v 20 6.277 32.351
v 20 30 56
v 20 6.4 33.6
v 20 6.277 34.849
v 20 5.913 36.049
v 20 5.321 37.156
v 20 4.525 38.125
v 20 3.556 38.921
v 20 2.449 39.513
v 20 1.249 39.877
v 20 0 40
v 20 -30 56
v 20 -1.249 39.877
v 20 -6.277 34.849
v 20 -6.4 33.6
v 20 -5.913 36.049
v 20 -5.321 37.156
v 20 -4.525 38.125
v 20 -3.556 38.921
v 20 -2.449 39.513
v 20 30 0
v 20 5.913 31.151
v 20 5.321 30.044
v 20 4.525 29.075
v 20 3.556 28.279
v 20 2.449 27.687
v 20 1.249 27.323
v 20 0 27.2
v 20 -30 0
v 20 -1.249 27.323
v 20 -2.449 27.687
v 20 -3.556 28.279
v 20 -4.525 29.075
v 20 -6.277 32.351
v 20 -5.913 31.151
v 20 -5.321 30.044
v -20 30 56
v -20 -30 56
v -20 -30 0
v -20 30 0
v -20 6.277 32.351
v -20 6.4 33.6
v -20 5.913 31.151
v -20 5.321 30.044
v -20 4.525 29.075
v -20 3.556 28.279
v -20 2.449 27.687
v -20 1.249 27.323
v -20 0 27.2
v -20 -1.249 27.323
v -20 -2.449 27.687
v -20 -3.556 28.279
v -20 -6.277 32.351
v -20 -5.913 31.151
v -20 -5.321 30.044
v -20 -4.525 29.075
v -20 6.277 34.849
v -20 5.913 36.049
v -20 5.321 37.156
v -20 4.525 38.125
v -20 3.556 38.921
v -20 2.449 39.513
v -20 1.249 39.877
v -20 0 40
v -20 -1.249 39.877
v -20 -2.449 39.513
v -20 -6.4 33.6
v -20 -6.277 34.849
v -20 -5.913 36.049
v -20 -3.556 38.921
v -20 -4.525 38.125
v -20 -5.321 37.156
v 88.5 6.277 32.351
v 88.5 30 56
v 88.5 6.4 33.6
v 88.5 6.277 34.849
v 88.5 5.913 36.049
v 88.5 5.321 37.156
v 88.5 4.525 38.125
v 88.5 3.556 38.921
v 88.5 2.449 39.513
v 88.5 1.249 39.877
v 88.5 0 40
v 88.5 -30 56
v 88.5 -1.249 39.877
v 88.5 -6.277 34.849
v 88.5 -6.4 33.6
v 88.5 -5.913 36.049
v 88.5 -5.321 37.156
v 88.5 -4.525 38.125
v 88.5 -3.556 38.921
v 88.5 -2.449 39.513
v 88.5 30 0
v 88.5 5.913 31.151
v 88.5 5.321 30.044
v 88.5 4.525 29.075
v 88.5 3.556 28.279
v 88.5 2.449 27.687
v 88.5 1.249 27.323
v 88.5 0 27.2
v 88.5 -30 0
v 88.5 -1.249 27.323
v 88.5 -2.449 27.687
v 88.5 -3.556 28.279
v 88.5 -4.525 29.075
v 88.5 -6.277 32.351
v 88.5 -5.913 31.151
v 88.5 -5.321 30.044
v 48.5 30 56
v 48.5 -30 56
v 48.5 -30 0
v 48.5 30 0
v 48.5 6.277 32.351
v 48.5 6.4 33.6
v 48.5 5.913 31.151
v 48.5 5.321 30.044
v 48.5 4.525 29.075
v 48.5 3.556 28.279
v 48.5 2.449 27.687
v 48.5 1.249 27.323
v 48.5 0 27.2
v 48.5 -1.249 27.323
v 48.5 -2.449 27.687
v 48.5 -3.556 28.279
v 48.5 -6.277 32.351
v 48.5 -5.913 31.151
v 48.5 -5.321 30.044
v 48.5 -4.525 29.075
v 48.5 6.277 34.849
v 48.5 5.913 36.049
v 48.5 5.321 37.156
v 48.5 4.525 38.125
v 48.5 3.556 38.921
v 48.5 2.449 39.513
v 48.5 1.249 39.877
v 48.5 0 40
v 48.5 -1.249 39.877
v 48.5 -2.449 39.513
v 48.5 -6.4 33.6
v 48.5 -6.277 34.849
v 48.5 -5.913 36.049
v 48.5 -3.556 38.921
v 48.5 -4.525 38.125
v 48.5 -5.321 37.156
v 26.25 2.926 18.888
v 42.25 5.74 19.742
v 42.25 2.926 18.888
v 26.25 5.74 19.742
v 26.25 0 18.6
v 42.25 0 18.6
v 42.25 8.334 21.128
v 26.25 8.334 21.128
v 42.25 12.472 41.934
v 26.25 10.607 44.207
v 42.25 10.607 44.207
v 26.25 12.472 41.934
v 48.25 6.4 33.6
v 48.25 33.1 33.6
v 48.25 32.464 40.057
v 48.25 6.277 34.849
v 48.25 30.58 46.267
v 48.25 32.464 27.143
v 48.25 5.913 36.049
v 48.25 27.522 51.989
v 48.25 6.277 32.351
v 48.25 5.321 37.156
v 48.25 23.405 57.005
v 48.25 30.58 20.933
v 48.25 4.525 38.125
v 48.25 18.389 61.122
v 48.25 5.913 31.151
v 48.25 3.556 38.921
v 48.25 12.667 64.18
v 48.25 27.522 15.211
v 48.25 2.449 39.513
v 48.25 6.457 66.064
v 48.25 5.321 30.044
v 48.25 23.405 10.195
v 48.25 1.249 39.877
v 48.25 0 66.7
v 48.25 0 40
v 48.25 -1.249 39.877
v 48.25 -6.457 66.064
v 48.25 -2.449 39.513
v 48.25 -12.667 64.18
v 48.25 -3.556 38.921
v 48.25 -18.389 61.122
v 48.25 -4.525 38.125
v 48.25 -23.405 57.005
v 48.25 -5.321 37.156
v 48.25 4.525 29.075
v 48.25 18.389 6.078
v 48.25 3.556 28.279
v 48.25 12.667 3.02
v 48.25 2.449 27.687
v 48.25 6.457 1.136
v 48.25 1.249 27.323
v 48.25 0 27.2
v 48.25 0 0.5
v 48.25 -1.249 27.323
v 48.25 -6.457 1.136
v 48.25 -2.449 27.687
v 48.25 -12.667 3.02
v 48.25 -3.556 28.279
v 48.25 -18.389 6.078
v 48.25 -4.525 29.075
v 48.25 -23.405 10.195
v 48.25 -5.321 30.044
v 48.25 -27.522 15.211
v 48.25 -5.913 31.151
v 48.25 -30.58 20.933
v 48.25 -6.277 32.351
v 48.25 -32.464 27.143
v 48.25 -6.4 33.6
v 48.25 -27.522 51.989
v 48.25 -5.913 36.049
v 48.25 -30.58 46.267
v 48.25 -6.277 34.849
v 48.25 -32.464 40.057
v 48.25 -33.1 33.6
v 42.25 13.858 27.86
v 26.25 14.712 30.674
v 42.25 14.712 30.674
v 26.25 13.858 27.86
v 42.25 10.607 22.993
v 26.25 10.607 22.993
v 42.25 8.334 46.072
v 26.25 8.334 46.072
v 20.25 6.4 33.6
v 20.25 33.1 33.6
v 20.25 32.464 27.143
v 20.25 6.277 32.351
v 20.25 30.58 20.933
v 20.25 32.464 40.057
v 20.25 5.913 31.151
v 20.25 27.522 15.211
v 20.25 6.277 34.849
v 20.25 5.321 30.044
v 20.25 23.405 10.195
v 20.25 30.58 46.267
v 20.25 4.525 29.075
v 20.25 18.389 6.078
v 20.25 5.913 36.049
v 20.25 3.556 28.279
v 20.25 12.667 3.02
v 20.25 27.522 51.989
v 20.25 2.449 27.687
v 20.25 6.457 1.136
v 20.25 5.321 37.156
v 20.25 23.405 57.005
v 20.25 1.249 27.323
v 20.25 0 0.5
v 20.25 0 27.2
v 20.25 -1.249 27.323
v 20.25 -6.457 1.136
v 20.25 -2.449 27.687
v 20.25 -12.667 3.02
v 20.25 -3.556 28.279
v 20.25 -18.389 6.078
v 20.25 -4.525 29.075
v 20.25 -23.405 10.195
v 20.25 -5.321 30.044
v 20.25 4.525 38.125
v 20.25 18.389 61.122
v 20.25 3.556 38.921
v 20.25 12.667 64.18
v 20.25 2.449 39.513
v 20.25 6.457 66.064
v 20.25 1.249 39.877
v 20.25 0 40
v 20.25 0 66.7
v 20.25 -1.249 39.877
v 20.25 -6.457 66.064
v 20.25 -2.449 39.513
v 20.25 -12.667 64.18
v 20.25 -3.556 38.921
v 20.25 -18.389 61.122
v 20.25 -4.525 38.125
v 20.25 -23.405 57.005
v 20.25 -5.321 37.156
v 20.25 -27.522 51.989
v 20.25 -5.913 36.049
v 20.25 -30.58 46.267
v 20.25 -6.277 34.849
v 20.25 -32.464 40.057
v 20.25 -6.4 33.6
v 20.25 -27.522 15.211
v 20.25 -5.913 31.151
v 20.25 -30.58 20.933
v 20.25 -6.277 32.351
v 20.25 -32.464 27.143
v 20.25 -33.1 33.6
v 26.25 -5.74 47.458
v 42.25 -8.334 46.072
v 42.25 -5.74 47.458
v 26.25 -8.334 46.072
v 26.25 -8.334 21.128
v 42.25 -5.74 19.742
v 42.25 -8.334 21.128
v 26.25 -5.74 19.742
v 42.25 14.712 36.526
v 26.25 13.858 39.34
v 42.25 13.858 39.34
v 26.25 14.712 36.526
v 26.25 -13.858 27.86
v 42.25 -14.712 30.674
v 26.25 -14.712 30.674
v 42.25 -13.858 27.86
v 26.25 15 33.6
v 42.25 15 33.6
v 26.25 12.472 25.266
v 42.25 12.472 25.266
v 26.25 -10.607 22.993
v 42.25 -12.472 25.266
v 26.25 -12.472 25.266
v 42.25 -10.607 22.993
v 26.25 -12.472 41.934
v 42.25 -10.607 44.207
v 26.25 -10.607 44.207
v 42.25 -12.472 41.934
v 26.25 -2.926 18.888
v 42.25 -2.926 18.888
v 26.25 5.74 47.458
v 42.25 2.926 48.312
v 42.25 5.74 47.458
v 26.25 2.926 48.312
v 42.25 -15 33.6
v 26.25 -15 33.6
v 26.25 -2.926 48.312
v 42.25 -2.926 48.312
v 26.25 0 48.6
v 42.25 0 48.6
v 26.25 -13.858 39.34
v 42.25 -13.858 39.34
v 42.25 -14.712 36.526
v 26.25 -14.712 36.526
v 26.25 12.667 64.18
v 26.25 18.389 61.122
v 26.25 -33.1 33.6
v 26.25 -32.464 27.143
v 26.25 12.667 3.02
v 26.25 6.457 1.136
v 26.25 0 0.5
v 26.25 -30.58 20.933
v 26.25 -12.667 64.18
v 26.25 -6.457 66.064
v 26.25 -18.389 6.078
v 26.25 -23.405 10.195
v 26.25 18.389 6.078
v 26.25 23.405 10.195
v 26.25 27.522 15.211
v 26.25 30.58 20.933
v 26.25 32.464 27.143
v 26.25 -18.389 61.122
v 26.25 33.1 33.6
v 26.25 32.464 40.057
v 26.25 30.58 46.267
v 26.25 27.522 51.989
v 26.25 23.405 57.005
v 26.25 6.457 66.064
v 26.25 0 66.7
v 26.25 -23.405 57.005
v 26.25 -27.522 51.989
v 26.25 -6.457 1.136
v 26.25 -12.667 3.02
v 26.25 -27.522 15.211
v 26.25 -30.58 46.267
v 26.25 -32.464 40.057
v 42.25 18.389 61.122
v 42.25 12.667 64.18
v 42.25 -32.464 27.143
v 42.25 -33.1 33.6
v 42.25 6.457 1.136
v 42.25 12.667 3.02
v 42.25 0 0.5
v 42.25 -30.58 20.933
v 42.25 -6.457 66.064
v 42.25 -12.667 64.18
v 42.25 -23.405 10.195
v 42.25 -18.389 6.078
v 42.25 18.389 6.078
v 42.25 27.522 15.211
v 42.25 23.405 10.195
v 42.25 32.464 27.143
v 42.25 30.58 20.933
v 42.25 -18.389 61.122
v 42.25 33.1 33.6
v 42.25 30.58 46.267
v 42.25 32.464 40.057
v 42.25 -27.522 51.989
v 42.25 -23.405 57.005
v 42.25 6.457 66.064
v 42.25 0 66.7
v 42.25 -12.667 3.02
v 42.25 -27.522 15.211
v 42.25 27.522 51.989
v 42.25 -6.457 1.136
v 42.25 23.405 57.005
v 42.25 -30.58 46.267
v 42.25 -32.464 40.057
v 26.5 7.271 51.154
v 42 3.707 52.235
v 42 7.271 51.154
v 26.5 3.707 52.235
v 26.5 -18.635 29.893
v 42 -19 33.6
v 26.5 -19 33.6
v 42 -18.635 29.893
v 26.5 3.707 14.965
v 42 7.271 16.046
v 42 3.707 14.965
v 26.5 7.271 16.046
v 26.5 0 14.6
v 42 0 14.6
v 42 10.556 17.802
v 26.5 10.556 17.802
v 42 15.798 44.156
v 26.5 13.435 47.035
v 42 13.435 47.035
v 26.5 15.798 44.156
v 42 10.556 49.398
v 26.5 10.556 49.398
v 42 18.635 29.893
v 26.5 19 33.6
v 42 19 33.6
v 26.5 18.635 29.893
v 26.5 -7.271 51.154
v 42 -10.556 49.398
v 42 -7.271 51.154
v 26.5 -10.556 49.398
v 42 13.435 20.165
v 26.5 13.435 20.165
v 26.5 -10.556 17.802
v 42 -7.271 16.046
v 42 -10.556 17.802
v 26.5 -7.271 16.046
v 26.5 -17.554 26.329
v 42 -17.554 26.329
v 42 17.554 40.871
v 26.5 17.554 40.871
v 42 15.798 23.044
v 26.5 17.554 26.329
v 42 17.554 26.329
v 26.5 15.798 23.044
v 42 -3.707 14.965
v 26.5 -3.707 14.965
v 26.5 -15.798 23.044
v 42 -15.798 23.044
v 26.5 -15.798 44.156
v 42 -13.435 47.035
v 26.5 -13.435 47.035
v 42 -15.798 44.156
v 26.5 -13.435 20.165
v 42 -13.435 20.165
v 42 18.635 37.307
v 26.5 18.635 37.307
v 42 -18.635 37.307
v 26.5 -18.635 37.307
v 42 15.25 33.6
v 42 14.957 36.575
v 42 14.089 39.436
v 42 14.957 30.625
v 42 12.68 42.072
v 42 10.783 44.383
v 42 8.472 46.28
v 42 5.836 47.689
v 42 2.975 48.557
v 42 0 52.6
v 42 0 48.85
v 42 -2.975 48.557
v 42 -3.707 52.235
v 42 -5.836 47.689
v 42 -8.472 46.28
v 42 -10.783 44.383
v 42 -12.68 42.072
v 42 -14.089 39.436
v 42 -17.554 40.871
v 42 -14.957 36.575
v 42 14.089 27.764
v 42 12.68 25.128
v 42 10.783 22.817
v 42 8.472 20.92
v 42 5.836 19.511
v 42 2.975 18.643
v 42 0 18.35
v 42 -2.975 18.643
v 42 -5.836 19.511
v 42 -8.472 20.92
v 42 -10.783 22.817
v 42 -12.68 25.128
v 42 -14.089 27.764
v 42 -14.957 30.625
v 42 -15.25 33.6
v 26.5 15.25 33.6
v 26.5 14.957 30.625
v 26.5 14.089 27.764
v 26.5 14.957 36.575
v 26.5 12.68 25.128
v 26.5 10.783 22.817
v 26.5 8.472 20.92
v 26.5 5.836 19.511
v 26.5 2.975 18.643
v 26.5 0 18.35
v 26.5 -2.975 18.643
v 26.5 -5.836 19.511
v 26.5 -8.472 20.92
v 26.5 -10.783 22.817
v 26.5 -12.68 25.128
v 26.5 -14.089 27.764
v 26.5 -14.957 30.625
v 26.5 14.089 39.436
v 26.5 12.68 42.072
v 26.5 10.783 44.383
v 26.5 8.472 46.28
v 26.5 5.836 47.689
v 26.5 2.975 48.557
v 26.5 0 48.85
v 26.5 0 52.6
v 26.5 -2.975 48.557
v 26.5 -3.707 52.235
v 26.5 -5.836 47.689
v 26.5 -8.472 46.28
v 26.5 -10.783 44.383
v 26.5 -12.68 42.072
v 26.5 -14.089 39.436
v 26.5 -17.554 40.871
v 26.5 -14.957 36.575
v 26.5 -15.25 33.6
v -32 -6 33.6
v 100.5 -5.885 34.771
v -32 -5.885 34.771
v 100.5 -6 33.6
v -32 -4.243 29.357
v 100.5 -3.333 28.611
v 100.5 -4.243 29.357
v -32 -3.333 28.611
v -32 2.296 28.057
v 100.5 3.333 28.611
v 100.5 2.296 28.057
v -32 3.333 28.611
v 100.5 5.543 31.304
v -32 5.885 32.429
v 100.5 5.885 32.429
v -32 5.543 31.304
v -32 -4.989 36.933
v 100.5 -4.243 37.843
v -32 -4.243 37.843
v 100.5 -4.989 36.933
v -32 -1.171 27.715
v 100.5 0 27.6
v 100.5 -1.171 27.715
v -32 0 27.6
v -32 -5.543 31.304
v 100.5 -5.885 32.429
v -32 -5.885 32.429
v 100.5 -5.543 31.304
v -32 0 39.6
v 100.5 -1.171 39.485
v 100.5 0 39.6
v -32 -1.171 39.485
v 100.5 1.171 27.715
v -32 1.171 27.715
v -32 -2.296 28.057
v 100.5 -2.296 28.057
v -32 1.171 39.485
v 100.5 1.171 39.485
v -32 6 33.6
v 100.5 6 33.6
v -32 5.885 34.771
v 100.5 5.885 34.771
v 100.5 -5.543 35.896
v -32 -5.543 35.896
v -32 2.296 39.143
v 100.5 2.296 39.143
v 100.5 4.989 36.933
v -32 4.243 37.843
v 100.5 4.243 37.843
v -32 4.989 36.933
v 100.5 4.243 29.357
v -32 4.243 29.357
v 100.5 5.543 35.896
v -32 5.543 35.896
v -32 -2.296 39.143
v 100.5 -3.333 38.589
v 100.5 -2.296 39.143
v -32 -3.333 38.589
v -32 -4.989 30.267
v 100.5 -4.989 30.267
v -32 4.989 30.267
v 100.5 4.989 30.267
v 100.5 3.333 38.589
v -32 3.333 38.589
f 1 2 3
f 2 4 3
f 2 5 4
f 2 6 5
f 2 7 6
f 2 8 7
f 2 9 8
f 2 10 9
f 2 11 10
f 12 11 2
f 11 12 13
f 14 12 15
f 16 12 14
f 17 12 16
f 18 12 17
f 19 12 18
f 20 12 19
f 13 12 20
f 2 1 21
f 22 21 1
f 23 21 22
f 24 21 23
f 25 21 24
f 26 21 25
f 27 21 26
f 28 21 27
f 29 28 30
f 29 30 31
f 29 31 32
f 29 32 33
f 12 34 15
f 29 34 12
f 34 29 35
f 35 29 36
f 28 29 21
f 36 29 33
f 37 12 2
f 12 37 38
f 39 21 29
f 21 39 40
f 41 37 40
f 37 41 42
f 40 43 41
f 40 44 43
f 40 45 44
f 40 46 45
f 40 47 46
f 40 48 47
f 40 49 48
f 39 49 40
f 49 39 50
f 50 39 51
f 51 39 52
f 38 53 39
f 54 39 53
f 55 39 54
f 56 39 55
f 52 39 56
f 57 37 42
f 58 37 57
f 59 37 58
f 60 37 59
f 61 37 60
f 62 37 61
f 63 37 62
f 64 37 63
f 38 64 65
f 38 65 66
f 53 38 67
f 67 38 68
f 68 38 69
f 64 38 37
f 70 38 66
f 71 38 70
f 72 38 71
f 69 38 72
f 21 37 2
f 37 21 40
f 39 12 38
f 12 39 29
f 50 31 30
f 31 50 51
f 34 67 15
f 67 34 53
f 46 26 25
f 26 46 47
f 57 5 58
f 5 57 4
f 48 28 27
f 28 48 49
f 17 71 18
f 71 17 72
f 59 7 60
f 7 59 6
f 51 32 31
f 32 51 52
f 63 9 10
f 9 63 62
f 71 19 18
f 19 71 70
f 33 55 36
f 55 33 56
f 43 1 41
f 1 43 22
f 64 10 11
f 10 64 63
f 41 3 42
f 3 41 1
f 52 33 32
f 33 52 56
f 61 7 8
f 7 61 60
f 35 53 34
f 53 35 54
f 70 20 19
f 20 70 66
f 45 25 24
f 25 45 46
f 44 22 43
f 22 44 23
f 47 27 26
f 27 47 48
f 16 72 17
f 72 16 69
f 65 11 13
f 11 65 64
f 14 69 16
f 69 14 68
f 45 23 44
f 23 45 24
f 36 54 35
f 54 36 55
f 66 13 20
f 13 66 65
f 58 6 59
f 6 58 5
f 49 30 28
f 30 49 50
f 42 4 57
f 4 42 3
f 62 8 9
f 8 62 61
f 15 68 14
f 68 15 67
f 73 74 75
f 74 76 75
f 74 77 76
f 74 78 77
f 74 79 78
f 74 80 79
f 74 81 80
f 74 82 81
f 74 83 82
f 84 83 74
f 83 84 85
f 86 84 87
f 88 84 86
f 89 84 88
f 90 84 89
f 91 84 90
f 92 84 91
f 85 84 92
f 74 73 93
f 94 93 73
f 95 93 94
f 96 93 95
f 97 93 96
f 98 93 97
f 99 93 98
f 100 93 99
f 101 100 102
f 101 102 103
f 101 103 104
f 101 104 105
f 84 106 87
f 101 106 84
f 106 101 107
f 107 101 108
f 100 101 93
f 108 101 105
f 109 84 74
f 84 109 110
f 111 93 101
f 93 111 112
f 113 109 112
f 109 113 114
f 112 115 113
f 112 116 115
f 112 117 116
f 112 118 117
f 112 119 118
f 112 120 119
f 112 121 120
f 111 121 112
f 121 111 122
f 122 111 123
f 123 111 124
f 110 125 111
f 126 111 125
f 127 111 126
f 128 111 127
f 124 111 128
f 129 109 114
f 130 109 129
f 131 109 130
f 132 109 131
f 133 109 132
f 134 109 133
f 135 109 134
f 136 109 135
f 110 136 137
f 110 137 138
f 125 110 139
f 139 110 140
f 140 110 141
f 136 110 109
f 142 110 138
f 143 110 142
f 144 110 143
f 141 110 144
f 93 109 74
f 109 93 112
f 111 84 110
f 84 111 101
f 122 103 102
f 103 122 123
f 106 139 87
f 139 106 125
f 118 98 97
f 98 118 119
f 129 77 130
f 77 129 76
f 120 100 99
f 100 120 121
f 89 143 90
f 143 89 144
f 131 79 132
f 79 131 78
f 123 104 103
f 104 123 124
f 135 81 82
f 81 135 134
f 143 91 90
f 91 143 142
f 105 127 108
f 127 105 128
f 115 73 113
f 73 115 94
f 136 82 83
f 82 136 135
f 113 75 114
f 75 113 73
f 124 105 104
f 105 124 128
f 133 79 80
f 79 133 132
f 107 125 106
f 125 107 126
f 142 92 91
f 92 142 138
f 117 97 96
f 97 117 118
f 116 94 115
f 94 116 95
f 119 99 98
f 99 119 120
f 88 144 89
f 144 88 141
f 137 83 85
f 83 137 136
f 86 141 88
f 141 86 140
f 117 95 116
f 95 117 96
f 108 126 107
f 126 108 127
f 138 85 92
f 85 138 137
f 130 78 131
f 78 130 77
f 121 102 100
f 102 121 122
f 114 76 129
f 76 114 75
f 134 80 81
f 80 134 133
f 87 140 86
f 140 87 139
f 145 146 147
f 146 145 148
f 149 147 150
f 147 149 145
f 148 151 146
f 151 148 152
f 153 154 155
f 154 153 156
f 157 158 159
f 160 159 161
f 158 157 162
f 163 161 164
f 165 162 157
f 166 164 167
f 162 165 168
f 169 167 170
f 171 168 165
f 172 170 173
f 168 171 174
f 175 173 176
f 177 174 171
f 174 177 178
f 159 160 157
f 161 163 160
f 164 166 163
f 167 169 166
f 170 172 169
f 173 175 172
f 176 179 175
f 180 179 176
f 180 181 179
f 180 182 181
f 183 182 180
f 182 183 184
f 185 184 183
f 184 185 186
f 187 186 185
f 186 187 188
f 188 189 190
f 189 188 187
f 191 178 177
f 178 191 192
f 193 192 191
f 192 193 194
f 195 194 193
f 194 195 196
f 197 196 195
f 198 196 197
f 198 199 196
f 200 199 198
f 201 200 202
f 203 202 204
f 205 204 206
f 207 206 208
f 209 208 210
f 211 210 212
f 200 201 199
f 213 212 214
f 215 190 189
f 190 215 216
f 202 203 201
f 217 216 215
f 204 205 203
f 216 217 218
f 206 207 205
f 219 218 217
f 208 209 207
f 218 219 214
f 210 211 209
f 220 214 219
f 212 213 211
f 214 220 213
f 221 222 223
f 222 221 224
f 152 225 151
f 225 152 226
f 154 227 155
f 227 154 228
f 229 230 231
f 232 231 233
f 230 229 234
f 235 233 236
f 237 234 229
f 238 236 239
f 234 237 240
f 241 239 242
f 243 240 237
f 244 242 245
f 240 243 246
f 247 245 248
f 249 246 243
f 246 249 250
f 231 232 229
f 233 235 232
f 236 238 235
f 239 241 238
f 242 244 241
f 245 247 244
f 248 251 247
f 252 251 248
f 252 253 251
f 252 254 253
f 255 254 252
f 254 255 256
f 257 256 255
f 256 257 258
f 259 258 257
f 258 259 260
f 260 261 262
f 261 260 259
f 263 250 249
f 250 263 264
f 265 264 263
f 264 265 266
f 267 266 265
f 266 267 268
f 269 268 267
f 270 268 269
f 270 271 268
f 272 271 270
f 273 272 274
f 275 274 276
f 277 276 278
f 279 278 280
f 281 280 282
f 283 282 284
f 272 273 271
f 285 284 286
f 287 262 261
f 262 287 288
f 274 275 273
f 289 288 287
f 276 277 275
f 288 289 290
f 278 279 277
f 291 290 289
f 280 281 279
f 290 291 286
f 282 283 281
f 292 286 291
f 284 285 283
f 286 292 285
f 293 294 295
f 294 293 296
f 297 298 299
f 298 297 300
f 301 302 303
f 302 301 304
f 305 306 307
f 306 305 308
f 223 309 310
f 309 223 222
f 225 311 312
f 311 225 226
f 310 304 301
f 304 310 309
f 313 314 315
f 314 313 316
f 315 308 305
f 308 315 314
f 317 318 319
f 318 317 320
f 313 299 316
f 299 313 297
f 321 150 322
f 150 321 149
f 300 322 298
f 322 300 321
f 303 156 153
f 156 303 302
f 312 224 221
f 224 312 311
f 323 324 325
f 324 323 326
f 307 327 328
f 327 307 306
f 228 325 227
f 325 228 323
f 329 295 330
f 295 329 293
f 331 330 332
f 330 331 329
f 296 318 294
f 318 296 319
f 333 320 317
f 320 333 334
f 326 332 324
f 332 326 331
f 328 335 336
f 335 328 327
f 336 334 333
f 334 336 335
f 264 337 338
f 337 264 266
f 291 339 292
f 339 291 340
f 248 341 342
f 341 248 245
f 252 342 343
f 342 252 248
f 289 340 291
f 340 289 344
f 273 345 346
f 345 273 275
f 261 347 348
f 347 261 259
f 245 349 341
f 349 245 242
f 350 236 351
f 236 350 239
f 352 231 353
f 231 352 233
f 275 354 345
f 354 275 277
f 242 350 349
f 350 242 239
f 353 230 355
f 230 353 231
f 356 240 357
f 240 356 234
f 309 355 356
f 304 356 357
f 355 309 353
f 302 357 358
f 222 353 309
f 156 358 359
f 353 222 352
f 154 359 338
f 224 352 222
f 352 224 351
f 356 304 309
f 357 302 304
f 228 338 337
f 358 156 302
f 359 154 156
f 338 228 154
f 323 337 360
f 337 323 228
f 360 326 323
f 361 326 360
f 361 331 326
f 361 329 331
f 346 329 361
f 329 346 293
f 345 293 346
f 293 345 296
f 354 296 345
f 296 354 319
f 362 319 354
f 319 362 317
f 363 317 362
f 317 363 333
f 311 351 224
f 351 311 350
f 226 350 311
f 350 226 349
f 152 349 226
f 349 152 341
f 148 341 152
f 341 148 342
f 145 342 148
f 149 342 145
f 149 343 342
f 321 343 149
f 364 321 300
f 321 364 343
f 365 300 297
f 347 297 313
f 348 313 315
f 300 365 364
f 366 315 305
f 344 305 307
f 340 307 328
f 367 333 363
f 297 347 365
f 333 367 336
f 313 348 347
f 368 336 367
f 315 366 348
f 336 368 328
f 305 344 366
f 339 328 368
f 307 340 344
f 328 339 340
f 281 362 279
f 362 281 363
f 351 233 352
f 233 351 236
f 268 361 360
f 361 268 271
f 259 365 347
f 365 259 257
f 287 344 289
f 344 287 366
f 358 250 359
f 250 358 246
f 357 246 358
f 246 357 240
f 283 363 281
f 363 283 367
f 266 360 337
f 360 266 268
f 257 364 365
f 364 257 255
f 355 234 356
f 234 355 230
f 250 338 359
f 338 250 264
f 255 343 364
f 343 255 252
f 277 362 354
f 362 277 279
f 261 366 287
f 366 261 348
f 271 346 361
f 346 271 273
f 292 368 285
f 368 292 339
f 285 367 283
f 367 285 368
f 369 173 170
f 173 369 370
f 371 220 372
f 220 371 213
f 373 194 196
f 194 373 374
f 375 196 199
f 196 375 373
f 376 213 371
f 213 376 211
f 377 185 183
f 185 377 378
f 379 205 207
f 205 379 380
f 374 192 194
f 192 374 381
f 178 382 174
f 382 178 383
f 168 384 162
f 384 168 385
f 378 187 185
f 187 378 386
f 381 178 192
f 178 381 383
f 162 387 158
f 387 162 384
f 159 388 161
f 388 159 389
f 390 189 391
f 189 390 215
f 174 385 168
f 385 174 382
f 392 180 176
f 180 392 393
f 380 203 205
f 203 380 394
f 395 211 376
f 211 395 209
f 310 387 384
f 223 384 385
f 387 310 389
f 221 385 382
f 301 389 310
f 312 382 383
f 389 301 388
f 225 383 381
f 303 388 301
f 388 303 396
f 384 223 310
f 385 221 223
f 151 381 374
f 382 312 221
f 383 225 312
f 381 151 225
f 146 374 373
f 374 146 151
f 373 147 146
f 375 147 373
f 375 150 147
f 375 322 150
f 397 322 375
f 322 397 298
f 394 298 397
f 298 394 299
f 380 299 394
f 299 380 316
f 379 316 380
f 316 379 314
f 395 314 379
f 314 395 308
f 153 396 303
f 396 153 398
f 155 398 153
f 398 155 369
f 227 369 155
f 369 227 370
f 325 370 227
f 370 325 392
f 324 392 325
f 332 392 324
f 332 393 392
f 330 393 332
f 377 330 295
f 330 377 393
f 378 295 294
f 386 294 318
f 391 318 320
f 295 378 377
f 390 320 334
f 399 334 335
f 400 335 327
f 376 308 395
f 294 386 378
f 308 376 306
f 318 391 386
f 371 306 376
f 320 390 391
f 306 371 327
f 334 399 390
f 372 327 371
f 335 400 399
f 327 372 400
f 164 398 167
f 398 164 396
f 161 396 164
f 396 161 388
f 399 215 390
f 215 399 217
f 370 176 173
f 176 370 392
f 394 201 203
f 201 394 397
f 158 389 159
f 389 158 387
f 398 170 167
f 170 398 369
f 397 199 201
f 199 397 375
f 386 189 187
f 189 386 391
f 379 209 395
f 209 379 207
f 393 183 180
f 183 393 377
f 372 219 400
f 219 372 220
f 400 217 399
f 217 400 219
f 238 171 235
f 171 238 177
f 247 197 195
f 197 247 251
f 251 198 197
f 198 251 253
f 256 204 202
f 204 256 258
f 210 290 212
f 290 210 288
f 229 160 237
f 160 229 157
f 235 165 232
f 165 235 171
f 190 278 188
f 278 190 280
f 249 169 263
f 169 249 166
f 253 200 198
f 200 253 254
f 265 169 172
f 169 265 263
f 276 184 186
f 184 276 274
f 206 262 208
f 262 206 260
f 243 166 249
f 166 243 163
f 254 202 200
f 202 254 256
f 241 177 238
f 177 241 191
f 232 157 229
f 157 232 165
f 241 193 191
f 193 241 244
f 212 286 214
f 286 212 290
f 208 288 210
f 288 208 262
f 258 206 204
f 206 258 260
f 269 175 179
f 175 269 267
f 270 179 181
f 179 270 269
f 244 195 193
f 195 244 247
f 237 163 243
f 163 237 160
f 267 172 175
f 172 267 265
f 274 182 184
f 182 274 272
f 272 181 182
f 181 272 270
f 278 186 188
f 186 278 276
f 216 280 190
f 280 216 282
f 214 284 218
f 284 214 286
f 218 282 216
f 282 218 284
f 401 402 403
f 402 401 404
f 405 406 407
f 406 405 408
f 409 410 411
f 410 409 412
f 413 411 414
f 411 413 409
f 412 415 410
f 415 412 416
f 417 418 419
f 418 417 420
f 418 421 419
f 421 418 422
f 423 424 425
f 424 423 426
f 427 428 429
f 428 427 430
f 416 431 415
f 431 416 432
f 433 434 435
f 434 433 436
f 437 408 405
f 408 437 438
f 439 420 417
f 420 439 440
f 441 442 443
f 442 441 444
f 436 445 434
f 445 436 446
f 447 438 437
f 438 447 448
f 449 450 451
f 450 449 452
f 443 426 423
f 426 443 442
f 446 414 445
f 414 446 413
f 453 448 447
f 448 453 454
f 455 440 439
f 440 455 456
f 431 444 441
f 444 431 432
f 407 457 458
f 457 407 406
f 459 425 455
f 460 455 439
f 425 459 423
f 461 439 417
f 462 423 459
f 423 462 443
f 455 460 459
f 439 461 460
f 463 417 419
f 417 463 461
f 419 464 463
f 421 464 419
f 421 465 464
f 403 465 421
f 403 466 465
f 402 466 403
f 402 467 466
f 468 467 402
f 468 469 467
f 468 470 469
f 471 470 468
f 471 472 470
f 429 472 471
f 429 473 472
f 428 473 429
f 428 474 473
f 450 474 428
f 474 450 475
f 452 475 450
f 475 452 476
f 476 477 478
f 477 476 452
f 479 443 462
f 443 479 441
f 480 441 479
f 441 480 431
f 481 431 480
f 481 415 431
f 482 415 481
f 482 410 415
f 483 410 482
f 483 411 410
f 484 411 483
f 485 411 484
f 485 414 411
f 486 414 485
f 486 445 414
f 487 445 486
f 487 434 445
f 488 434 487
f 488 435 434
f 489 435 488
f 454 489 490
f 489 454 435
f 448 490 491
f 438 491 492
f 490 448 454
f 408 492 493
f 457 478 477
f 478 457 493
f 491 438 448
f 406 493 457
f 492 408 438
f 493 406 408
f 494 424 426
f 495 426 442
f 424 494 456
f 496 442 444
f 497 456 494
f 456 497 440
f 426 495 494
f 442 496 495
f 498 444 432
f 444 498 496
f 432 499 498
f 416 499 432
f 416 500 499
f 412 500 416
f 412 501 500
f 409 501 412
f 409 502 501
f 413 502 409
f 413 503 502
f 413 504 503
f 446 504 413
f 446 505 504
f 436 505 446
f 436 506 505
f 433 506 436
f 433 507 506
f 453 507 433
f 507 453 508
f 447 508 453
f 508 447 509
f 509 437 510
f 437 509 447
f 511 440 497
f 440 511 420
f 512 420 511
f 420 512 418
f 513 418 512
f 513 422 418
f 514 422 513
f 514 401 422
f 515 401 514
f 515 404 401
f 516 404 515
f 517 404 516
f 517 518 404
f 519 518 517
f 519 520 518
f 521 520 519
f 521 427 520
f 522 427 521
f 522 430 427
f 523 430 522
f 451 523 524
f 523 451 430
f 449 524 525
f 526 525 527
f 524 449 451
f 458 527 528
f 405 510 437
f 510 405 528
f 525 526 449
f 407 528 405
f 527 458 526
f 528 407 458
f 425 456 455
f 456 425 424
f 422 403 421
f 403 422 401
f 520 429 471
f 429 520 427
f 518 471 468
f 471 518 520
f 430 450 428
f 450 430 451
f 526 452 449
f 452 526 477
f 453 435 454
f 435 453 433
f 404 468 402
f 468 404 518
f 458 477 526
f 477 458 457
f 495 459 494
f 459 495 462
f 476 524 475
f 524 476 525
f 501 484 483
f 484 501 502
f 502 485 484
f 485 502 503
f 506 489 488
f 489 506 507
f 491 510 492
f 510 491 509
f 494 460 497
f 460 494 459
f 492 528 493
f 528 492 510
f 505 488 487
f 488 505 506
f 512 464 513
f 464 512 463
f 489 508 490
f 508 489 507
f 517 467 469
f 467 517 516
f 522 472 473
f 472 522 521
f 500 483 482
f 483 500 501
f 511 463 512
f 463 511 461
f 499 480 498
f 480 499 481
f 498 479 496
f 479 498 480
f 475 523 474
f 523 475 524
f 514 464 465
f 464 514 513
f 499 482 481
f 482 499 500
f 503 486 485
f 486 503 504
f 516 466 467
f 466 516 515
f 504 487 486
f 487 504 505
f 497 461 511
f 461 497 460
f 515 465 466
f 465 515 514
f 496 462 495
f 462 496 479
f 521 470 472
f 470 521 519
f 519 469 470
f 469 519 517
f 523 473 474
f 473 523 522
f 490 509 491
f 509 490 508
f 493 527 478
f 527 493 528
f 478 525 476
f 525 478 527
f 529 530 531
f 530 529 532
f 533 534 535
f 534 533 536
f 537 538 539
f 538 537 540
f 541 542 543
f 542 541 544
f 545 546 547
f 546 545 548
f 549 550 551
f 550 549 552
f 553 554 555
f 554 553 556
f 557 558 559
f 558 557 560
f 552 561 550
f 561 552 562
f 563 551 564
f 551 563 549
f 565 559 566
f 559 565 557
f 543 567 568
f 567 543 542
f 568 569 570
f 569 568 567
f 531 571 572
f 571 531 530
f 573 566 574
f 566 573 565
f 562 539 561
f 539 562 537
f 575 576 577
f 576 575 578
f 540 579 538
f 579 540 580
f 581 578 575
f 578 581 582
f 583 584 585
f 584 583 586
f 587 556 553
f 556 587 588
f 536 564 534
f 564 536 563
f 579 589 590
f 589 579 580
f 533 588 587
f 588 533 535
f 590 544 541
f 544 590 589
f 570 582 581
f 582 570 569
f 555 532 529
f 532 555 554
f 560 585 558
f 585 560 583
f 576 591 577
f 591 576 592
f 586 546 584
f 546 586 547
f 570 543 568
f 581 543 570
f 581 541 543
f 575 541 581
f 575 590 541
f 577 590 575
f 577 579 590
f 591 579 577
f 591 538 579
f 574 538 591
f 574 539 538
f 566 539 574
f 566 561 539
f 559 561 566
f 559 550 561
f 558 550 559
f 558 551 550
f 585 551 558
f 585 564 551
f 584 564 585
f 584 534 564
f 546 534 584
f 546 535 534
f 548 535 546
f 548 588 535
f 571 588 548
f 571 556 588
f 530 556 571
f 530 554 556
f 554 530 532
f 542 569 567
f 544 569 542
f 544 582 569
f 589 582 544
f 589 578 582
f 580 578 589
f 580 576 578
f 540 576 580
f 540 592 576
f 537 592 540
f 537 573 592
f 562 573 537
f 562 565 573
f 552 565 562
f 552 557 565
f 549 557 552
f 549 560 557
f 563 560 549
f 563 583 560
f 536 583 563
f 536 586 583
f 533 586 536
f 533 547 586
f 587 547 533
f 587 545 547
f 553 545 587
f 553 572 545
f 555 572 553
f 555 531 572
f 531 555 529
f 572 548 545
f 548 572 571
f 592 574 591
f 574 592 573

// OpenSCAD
$fn = 32;

// ------------------------------------------------------------------------
// Pulley assembly: d66.2 pulley with a belt, shaft d12
// Every part is its own module, assembly() places them once.
// ------------------------------------------------------------------------

// --- part 1 ---
module support1() {
  difference() {
    translate([-20, -30, 0]) cube([40, 60, 56]);
    translate([0, 0, 33.6]) rotate([0, 90, 0]) cylinder(h = 42, d = 12.8, center = true);
  }
}

// --- part 2 ---
module support2() {
  difference() {
    translate([-20, -30, 0]) cube([40, 60, 56]);
    translate([0, 0, 33.6]) rotate([0, 90, 0]) cylinder(h = 42, d = 12.8, center = true);
  }
}

// --- part 3 ---
module shaft() {
  translate([0, 0, -66.25]) cylinder(h = 132.5, d = 12);
}

// --- part 4 ---
module pulley() {
  difference() {
    union() {
      cylinder(h = 28, d = 30);
      cylinder(h = 6, d = 66.2);
      translate([0, 0, 22]) cylinder(h = 6, d = 66.2);
    }
    translate([0, 0, -1]) cylinder(h = 30, d = 12.8);
  }
}

// --- part 5 ---
module belt() {
  difference() {
      translate([0, 0, 0]) cylinder(h = 15.5, d = 38);
      translate([0, 0, -1]) cylinder(h = 17.5, d = 30.5);
    }
}

// --- assembly ---
module assembly() {
  translate([0, 0, 0]) rotate([0, 0, 0]) support1();
  translate([68.5, 0, 0]) rotate([0, 0, 0]) support2();
  translate([34.25, 0, 33.6]) rotate([0, 90, 0]) shaft();
  translate([20.25, 0, 33.6]) rotate([0, 90, 0]) pulley();
  translate([26.5, 0, 33.6]) rotate([0, 90, 0]) belt();
}

assembly();
